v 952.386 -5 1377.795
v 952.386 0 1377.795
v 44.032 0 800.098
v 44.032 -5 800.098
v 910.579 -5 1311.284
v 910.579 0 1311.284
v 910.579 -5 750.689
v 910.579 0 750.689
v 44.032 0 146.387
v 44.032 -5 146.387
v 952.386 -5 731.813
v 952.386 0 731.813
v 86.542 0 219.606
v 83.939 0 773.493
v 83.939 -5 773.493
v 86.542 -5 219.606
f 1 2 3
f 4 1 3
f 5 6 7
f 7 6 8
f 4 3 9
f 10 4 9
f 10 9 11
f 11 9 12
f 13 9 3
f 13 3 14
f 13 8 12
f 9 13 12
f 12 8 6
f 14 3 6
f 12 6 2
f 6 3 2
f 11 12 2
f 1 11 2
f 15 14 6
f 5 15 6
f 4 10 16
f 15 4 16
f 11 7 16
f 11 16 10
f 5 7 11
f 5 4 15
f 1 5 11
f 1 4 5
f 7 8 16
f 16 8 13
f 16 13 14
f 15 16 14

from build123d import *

# Parameters (mm, degrees)
F1_DEPTH = 5


with BuildPart() as f1:
    # F0 (on Front) → F1 (new body)
    with BuildSketch(Plane.XZ):
        Polygon((952.385604, 1377.7951), (44.032343, 800.097644), (44.032343, 146.387324), (952.385604, 731.812539), align=None)
        Polygon((86.542191, 219.605512), (83.939075, 773.493111), (910.578549, 1311.283827), (910.578549, 750.689268), align=None, mode=Mode.SUBTRACT)
    extrude(amount=F1_DEPTH)


solid = f1.part
